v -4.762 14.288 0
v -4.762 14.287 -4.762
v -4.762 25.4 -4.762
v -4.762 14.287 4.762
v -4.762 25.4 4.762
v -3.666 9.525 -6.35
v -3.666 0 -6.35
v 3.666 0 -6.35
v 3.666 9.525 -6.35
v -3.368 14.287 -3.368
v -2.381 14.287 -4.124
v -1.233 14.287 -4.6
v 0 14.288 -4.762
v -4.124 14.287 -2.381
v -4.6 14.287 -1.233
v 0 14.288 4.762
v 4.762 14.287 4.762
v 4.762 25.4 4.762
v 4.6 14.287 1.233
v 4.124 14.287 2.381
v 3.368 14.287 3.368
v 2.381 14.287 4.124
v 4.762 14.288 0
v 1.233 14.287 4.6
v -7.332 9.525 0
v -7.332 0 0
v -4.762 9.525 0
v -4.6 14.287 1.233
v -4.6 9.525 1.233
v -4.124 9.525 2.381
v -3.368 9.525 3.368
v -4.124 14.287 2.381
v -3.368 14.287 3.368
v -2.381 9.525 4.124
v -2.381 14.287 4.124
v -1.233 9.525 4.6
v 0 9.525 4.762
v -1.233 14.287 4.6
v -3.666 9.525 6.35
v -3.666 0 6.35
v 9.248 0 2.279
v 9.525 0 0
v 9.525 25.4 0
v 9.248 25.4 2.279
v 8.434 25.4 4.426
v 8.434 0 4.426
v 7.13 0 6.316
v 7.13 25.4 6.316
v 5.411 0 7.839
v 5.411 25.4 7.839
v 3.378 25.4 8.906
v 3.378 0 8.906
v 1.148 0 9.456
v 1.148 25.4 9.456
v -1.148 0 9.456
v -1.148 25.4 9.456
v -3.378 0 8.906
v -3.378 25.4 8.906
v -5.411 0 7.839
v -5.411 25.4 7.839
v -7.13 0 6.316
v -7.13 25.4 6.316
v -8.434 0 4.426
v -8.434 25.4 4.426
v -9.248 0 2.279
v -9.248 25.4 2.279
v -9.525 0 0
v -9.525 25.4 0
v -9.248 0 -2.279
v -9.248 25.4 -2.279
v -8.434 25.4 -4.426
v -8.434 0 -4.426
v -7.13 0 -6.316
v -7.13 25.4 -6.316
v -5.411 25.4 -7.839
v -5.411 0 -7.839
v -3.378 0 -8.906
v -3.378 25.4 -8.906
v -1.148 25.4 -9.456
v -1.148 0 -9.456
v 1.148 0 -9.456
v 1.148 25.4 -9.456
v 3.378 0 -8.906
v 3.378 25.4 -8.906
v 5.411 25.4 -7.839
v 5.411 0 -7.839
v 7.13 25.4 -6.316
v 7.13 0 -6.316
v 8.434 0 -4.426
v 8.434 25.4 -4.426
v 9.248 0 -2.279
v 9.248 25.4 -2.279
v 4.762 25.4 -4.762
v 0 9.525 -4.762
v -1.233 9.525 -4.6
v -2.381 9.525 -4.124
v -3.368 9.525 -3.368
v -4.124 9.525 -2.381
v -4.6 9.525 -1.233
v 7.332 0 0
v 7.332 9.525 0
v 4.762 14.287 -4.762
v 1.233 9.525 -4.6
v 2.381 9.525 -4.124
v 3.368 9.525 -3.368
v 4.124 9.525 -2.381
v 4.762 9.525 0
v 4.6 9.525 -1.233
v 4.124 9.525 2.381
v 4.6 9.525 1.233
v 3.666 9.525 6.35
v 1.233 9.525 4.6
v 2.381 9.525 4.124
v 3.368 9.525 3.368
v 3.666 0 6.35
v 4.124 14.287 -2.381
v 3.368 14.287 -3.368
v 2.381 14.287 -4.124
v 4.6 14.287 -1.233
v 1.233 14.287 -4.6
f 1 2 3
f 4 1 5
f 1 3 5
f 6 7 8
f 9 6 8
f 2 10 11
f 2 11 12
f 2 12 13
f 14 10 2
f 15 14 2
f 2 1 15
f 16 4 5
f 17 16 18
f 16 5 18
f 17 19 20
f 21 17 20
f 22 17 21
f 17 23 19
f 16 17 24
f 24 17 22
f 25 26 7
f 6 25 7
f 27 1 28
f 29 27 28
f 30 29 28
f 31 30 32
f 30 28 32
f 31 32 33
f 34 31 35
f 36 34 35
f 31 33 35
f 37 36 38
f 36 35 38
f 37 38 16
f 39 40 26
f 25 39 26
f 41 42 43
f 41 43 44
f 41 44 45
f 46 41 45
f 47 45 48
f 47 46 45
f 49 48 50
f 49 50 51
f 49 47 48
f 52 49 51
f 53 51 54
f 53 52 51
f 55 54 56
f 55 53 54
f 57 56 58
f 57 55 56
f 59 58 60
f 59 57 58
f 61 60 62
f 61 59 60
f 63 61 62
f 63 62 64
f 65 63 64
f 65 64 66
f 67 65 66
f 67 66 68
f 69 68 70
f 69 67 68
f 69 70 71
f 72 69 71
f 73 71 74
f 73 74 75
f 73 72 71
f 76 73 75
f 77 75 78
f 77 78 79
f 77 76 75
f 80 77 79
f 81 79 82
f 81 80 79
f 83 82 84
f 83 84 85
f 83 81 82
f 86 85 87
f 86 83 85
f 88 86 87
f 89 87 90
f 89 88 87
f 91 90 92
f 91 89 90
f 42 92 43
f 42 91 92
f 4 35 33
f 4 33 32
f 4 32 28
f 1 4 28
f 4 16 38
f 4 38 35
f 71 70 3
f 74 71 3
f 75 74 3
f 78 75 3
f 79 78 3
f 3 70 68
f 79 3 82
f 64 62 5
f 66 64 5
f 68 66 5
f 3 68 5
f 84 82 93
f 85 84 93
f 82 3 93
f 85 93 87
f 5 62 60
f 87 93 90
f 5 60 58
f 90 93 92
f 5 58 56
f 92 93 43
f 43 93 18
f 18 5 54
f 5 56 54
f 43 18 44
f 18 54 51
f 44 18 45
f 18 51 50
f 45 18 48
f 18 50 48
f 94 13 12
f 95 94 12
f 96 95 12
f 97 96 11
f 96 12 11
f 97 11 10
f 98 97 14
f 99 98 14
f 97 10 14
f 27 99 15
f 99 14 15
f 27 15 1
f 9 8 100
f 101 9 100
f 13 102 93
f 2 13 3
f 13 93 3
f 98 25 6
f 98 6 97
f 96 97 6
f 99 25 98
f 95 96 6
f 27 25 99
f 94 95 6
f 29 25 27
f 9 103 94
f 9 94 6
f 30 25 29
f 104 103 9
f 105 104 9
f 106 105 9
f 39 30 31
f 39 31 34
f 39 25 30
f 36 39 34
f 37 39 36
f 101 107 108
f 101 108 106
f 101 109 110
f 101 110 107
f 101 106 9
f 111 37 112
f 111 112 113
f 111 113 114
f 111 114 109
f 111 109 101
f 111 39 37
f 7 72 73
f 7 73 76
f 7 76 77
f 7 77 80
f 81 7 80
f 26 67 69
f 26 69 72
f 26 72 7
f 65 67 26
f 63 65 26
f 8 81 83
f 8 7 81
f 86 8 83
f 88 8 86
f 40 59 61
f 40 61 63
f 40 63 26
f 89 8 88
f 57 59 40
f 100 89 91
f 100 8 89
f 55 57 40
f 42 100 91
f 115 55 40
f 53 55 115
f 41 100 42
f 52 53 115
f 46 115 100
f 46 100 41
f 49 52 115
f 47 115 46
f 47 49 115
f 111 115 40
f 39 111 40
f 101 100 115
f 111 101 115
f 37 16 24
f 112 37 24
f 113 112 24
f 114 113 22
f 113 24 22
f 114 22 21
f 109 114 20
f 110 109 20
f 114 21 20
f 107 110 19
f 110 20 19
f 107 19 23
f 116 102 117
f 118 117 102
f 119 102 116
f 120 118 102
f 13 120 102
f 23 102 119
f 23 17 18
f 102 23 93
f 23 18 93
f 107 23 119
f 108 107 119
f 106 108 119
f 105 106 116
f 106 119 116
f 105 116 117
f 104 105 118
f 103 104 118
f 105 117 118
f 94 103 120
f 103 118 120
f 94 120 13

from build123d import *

# Parameters (mm, degrees)
F0_R     = 9.525
F1_DEPTH = 25.4
F3_DEPTH = 25.401
F4_DEPTH = 11.1125
F6_DEPTH = 9.525


with BuildPart() as f1:
    # F0 (on Front) → F1 (new body)
    with BuildSketch(Plane.XZ):
        Circle(F0_R)
    extrude(amount=-F1_DEPTH)

    # F2 (on face) → F3 (cut, through all)
    with BuildSketch(Plane(origin=(0, 25.4, 0), x_dir=(-1, 0, 0), z_dir=(0, 1, 0))):
        with BuildLine():
            ThreePointArc((-4.7625, 0), (-3.367596, -3.367596), (0, -4.7625))
            ThreePointArc((0, -4.7625), (3.367596, -3.367596), (4.7625, 0))
            ThreePointArc((4.7625, 0), (3.367596, 3.367596), (0, 4.7625))
            ThreePointArc((0, 4.7625), (-3.367596, 3.367596), (-4.7625, 0))
        make_face()
    extrude(amount=-F3_DEPTH, mode=Mode.SUBTRACT)

    # F2 (on face) → F4 (cut)
    with BuildSketch(Plane(origin=(0, 25.4, 0), x_dir=(-1, 0, 0), z_dir=(0, 1, 0))):
        with BuildLine():
            Line((-4.7625, 0), (-4.7625, -4.7625))
            Line((-4.7625, -4.7625), (0, -4.7625))
            ThreePointArc((0, -4.7625), (-3.367596, -3.367596), (-4.7625, 0))
        make_face()
        with BuildLine():
            ThreePointArc((4.7625, 0), (3.367596, -3.367596), (0, -4.7625))
            Line((0, -4.7625), (4.7625, -4.7625))
            Line((4.7625, -4.7625), (4.7625, 0))
        make_face()
        with BuildLine():
            Line((-4.7625, 4.7625), (-4.7625, 0))
            ThreePointArc((-4.7625, 0), (-3.367596, 3.367596), (0, 4.7625))
            Line((0, 4.7625), (-4.7625, 4.7625))
        make_face()
        with BuildLine():
            ThreePointArc((0, 4.7625), (3.367596, 3.367596), (4.7625, 0))
            Line((4.7625, 0), (4.7625, 4.7625))
            Line((4.7625, 4.7625), (0, 4.7625))
        make_face()
    extrude(amount=-F4_DEPTH, mode=Mode.SUBTRACT)

    # F5 (on face) → F6 (cut)
    with BuildSketch(Plane.XZ):
        Polygon((-7.332348, 0), (-3.666174, -6.35), (3.666174, -6.35), (7.332348, 0), (3.666174, 6.35), (-3.666174, 6.35), align=None)
    extrude(amount=-F6_DEPTH, mode=Mode.SUBTRACT)


solid = f1.part
